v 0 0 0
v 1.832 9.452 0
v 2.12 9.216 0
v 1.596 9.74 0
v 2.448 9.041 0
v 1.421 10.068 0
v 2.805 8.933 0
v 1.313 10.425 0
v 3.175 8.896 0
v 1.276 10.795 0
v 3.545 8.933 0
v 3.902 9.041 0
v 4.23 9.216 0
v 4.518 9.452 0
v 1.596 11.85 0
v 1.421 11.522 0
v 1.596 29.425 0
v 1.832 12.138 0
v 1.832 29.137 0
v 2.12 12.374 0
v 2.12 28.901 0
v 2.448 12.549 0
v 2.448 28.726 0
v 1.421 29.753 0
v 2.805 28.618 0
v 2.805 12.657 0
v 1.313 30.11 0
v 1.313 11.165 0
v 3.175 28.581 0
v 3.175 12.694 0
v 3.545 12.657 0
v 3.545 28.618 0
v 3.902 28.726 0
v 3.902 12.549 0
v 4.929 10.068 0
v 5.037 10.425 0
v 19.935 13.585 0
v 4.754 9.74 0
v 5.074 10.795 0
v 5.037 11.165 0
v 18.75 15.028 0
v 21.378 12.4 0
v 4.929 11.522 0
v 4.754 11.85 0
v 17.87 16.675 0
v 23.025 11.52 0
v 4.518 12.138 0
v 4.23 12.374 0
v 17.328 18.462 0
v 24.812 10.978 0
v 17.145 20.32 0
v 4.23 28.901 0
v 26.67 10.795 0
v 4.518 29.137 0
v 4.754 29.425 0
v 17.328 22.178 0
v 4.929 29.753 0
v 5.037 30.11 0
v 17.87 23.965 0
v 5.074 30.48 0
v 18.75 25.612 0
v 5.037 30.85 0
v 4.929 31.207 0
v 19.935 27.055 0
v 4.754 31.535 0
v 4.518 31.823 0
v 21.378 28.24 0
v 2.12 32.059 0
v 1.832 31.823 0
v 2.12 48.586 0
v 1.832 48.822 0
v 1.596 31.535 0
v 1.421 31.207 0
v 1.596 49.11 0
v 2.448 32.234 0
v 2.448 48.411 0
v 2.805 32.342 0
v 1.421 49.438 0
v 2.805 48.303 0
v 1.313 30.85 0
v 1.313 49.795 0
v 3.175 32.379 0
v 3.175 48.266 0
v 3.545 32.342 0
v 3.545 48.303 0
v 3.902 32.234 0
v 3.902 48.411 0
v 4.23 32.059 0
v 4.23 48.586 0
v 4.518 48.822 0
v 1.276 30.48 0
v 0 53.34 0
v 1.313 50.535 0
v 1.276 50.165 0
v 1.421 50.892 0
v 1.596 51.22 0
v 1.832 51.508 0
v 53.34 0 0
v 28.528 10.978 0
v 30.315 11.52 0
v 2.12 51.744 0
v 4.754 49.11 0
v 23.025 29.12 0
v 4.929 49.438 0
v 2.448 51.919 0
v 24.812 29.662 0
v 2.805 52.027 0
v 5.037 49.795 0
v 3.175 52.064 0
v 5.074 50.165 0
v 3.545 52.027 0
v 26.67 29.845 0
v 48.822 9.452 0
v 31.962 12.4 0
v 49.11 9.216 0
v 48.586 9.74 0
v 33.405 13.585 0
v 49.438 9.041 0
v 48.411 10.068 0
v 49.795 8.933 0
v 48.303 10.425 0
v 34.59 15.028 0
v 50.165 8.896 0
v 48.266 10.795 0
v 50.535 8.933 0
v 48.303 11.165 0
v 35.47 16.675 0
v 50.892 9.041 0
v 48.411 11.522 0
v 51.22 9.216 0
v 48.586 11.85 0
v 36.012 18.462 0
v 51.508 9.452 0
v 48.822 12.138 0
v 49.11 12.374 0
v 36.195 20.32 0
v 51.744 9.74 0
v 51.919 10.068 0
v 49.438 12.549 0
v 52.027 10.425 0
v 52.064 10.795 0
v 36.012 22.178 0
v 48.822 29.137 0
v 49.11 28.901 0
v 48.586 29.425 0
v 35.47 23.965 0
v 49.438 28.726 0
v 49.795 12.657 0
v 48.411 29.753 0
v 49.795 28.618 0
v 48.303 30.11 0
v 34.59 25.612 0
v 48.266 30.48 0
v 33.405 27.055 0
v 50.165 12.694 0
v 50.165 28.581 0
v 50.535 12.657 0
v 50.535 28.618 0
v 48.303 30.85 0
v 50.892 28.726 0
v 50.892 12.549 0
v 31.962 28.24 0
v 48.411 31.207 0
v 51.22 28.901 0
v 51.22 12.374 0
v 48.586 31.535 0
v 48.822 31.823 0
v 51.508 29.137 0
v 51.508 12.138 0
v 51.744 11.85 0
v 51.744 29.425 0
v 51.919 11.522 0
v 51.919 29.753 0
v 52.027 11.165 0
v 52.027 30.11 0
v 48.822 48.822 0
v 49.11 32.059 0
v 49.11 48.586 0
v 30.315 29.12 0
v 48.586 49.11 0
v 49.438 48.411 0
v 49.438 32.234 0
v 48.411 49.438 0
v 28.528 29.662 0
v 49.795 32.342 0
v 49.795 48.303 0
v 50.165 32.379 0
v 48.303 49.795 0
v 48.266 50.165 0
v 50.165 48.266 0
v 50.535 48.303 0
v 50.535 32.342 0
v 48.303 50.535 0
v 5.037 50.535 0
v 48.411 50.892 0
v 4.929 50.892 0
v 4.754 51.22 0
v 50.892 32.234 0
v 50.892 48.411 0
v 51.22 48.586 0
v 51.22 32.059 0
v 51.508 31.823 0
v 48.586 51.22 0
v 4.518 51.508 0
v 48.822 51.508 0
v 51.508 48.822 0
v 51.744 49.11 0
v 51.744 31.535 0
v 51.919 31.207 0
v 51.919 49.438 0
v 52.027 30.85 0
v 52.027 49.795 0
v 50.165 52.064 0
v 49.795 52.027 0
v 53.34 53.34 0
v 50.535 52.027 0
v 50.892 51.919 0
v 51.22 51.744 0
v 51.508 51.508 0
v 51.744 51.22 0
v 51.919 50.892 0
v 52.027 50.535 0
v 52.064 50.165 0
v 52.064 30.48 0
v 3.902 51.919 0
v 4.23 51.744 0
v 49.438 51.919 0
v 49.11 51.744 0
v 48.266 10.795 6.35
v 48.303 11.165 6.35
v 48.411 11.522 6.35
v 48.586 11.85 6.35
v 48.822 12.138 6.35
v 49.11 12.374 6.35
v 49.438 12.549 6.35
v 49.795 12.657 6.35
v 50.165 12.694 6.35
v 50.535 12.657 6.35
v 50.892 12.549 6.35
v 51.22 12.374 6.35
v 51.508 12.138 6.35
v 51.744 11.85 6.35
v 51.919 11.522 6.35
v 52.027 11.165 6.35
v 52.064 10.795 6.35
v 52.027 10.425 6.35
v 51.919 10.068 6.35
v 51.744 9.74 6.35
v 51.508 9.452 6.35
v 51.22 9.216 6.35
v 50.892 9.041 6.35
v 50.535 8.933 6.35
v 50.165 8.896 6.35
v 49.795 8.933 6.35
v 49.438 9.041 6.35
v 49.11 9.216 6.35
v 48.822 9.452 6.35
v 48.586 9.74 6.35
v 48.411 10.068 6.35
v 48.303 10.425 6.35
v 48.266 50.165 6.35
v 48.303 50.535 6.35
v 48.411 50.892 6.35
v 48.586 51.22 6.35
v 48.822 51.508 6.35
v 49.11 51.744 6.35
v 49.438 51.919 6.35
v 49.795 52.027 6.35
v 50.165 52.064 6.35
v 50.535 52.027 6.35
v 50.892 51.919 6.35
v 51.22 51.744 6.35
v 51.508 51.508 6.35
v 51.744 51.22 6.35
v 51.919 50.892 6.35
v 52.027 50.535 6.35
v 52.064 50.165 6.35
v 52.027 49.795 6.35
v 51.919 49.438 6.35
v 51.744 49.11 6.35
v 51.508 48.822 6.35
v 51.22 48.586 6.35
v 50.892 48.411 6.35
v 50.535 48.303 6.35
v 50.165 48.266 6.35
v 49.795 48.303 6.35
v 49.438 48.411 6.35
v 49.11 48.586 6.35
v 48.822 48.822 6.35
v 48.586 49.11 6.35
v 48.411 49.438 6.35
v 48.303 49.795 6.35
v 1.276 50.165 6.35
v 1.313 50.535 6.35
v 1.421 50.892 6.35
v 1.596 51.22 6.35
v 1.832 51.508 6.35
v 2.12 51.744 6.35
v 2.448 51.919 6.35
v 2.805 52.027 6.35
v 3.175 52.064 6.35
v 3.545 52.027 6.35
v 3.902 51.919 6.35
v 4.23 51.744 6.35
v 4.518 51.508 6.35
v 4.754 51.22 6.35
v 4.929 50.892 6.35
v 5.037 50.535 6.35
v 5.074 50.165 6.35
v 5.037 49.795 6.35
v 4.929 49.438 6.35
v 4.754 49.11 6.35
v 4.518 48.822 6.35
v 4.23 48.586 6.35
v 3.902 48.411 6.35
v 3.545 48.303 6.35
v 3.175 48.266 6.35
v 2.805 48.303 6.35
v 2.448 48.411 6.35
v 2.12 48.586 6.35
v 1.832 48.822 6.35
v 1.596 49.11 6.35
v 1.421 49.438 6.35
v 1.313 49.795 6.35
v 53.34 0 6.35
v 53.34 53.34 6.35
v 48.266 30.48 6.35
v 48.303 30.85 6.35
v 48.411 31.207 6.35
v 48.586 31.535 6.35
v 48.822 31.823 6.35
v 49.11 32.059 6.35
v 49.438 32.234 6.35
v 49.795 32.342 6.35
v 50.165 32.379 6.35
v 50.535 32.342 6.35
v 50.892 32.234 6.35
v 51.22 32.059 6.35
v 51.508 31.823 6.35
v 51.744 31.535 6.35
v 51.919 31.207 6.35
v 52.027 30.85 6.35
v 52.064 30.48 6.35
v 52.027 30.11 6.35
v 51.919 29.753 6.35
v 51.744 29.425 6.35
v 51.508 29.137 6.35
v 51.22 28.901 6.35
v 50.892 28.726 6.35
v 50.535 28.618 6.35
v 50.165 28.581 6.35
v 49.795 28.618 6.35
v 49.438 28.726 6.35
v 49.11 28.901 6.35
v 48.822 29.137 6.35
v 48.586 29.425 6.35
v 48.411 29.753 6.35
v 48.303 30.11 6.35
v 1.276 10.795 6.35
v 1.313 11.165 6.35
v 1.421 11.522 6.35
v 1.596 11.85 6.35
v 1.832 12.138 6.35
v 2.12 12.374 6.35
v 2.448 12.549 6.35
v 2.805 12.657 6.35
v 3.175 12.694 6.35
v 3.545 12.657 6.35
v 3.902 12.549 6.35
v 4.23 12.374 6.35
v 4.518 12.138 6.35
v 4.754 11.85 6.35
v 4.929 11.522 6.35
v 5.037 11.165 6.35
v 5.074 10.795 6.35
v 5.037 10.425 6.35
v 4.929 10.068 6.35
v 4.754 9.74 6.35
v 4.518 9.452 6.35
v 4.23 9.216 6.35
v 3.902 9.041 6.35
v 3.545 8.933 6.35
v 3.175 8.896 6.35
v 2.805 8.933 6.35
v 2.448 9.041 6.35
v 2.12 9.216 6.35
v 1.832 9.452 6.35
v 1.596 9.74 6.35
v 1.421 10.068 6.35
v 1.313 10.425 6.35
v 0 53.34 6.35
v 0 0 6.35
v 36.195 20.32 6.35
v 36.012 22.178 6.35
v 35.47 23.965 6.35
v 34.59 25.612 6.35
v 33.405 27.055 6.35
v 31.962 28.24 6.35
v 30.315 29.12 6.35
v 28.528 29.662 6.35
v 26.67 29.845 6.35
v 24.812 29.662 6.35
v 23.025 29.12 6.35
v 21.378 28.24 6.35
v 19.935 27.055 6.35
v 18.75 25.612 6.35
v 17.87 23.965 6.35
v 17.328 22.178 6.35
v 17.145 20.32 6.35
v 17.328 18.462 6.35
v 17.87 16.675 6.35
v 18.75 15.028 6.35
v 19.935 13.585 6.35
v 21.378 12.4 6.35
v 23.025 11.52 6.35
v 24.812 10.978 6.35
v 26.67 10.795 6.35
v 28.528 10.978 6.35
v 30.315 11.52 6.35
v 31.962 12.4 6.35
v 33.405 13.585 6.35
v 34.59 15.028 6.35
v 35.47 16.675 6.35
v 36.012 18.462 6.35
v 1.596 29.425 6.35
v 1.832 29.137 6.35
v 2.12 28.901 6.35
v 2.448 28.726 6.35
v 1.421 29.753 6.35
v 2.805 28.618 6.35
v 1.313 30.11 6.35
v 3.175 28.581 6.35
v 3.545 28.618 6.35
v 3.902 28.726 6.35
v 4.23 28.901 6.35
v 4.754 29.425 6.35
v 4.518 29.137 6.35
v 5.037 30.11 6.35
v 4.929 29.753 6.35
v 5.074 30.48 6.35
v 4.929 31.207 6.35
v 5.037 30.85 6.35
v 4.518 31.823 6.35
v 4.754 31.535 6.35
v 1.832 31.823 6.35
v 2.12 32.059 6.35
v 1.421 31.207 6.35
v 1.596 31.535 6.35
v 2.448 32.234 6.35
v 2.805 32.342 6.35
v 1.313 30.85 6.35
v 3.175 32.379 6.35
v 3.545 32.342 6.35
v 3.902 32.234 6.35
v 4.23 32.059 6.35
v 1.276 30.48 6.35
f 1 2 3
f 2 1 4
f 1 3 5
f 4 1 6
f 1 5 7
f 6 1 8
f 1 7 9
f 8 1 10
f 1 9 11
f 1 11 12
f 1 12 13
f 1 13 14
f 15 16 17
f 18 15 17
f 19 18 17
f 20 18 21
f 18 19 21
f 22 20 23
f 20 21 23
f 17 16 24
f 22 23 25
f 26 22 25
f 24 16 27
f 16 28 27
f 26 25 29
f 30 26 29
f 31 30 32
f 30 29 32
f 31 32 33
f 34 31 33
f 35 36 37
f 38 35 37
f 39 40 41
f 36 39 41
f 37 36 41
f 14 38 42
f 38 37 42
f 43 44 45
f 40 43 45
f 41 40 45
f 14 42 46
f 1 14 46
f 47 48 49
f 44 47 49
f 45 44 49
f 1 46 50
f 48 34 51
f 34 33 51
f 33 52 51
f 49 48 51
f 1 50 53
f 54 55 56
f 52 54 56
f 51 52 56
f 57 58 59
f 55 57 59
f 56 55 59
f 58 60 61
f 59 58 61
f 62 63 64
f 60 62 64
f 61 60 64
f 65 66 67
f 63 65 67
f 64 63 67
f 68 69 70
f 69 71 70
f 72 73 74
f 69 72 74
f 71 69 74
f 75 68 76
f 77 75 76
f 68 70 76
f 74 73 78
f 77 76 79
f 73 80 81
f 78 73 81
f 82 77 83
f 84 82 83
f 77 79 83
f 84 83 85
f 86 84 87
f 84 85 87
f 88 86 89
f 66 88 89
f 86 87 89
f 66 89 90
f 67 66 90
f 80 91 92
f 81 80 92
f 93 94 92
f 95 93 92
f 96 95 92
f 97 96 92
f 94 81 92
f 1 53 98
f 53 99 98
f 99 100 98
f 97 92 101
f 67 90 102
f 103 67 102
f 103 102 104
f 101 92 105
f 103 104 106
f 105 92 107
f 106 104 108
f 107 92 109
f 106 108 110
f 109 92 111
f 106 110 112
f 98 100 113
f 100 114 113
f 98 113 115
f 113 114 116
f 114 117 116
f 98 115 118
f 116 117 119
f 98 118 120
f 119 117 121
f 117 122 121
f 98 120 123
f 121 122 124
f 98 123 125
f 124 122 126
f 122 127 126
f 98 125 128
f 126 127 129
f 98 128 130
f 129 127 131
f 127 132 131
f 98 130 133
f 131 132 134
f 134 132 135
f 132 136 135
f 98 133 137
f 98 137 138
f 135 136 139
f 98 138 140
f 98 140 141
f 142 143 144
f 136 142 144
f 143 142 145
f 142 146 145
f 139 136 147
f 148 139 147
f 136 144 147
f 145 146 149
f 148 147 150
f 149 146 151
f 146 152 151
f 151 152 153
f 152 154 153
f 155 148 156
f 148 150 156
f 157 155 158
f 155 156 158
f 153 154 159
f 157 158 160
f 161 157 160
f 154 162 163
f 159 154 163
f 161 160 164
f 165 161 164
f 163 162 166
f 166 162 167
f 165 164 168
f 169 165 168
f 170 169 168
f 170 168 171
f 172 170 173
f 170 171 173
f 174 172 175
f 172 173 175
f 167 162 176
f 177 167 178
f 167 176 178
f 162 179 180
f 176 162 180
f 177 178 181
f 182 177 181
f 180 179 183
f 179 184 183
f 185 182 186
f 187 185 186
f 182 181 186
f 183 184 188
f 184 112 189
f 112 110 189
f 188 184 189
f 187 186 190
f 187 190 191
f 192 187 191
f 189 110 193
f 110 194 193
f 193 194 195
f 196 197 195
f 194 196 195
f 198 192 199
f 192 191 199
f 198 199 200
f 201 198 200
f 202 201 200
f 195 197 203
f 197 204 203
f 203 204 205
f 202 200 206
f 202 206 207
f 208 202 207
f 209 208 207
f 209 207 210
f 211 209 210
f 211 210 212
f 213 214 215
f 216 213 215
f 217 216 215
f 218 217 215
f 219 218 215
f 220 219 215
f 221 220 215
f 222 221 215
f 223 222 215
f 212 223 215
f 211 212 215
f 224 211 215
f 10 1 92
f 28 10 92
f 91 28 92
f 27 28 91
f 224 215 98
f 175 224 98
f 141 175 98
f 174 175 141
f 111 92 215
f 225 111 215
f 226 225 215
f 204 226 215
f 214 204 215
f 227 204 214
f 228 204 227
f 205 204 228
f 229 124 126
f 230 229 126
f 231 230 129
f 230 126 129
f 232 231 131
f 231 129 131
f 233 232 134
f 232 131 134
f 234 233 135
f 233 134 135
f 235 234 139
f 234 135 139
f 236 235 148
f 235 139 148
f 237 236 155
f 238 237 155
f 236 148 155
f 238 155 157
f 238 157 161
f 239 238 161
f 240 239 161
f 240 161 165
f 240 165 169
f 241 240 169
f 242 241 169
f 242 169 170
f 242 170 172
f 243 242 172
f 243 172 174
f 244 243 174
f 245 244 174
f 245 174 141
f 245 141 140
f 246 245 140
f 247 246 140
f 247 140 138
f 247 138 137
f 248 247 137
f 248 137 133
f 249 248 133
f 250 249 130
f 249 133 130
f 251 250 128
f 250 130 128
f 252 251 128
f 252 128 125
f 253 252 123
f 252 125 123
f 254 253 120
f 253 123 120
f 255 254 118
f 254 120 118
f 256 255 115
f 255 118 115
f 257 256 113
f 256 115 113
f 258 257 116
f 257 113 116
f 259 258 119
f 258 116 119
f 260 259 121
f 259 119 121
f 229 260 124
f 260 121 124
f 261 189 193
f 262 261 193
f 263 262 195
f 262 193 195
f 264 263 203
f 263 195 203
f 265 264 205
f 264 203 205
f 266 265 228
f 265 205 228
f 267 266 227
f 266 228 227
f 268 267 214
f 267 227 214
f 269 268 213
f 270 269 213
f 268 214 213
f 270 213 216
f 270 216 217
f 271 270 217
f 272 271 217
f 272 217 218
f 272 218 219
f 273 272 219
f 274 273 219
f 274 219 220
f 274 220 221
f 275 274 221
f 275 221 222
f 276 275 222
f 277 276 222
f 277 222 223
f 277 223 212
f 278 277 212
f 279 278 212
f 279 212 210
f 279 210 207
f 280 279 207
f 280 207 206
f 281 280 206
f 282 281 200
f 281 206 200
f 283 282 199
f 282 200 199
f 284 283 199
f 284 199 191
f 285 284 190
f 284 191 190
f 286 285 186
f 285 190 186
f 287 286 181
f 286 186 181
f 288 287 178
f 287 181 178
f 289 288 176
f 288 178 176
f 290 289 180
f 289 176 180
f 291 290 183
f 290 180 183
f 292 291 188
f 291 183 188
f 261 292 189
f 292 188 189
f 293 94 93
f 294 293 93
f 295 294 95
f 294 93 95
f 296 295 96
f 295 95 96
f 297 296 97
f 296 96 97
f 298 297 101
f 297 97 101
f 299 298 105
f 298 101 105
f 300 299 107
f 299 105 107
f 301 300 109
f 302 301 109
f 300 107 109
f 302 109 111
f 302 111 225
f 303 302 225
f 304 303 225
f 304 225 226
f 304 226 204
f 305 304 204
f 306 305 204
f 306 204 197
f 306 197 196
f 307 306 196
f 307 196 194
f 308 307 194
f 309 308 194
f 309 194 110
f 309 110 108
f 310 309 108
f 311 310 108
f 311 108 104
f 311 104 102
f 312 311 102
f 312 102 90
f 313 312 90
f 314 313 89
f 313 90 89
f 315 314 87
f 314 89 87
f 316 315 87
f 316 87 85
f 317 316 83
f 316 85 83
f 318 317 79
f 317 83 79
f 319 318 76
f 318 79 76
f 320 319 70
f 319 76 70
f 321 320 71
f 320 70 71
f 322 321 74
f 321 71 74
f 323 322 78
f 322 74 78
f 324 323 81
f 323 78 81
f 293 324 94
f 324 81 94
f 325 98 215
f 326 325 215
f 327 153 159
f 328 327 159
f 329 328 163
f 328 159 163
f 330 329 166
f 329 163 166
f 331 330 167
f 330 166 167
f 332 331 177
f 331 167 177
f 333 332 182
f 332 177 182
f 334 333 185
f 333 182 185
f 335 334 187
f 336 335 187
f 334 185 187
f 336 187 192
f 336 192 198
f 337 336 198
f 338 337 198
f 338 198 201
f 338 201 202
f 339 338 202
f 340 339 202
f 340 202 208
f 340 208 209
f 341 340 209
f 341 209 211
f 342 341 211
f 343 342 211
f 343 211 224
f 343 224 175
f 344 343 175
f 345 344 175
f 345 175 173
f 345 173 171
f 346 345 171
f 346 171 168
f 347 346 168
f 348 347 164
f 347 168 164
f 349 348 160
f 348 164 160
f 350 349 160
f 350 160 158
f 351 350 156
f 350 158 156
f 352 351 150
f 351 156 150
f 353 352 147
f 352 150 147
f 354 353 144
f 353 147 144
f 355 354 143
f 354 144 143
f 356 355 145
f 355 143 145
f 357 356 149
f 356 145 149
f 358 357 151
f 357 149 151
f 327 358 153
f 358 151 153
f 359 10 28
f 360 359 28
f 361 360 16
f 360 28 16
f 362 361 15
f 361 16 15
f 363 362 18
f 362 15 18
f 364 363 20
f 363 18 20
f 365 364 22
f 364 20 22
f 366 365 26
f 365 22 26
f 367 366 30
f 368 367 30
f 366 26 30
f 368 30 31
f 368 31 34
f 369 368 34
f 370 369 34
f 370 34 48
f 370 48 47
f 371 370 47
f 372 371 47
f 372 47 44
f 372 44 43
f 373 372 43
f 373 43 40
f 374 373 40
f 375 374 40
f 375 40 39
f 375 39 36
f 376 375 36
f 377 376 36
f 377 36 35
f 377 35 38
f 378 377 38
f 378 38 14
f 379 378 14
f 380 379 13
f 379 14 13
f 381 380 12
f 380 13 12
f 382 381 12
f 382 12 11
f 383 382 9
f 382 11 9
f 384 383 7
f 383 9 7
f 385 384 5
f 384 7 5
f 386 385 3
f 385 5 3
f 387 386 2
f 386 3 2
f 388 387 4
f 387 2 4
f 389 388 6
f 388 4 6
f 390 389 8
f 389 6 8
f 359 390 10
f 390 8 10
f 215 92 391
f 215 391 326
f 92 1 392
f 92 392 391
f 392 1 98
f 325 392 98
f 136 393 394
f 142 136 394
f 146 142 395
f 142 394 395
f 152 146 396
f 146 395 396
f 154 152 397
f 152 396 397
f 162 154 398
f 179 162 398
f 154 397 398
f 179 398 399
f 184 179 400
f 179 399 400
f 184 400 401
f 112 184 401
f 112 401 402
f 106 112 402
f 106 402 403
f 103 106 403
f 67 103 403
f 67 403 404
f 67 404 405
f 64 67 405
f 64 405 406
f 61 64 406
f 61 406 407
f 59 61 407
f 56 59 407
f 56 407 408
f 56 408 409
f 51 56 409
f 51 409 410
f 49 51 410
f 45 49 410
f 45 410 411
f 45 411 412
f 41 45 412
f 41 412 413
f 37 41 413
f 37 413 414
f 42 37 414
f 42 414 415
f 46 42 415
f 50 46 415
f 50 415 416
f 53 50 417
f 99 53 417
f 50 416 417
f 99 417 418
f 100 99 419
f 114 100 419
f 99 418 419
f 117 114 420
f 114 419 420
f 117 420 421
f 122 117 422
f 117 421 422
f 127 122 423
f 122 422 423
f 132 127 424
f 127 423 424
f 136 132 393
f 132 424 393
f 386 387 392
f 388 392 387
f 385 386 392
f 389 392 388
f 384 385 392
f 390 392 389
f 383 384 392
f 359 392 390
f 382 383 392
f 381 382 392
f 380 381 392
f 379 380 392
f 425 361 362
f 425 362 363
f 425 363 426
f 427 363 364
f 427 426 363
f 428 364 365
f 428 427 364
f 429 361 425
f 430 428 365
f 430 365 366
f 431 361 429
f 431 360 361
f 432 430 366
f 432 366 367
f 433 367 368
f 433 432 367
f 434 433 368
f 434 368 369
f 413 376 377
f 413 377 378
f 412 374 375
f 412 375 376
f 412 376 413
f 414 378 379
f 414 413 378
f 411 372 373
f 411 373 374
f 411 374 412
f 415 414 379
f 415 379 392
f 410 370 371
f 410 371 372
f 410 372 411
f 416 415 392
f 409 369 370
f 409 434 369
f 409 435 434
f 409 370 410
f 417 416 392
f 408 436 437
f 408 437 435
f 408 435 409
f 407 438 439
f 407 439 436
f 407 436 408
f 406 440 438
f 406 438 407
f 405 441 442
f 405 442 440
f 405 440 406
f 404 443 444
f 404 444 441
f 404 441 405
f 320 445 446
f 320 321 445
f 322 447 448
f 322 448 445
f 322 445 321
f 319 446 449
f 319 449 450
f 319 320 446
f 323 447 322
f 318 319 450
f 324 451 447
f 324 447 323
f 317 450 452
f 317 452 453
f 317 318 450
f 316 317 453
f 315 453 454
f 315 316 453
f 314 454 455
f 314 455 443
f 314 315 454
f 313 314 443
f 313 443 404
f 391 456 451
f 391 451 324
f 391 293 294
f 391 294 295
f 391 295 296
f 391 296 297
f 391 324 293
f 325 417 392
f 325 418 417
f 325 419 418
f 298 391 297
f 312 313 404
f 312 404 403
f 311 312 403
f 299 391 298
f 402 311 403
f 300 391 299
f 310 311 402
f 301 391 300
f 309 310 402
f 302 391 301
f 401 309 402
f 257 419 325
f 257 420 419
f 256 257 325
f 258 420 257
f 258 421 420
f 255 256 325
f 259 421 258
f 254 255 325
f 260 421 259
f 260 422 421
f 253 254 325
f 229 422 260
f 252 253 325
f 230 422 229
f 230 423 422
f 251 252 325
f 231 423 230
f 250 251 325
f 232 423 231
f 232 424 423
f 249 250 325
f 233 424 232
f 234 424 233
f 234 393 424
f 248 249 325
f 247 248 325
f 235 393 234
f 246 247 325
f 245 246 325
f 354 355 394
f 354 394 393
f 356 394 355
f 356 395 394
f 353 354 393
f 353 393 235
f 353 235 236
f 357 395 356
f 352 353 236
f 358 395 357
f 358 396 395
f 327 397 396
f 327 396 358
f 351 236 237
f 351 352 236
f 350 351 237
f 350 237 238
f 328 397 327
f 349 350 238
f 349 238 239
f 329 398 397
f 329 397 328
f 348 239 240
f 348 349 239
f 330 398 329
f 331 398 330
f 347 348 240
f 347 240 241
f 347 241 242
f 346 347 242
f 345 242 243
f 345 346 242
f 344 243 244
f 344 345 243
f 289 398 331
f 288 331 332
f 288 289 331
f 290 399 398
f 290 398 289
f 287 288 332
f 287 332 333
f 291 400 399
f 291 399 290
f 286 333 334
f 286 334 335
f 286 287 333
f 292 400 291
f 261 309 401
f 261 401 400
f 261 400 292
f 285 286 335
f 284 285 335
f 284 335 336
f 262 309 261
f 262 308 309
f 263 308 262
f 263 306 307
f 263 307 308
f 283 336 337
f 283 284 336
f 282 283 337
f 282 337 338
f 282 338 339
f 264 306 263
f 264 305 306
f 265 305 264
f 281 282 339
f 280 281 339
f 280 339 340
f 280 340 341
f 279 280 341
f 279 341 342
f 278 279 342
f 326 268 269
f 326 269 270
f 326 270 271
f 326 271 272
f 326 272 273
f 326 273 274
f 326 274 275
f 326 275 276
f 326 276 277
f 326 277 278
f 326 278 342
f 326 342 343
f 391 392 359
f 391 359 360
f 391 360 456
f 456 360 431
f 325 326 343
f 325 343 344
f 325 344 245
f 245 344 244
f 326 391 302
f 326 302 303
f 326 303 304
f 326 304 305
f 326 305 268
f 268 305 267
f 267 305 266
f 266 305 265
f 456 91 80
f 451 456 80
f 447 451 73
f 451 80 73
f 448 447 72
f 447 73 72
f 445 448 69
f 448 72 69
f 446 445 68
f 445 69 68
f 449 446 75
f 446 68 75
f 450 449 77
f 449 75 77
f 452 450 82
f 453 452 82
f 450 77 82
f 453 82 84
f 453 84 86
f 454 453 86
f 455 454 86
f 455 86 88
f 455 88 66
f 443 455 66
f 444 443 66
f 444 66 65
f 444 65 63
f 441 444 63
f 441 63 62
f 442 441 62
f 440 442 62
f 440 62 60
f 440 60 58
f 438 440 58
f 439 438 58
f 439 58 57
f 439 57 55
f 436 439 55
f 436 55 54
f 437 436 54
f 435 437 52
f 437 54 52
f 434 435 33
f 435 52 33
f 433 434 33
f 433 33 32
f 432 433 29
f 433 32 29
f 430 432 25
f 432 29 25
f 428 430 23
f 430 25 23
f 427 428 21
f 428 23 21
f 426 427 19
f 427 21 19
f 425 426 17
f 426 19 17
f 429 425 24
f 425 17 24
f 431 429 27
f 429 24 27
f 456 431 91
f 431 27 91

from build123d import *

# Parameters (mm, degrees)
SKETCH1_W                 = 53.34
SKETCH1_H                 = 53.34
BOSS_EXTRUDE1_DEPTH       = 6.35
SKETCH2_R                 = 9.525
CUT_EXTRUDE1_DEPTH        = 1
CUT_EXTRUDE1_DEPTH_BACK   = 7.35
F_6_CLEARANCE_HOLE1_D     = 3.7973
F_6_CLEARANCE_HOLE1_DEPTH = 6.35


with BuildPart() as part:
    # Sketch1 → Boss-Extrude1 (new body)
    with BuildSketch(Plane.XY):
        with Locations((26.67, 26.67)):
            Rectangle(SKETCH1_W, SKETCH1_H)
    extrude(amount=BOSS_EXTRUDE1_DEPTH)

    # Sketch2 → Cut-Extrude1 (cut, two sides)
    with BuildSketch(Plane.XY.offset(6.35)) as cut_extrude1_sk:
        with Locations((26.67, 20.32)):
            Circle(SKETCH2_R)
    extrude(amount=CUT_EXTRUDE1_DEPTH, mode=Mode.SUBTRACT)
    extrude(cut_extrude1_sk.sketch, amount=-CUT_EXTRUDE1_DEPTH_BACK, mode=Mode.SUBTRACT)

    # #6 Clearance Hole1
    with Locations(Plane.XY.offset(6.35)):
        with Locations((3.175, 50.165), (50.165, 50.165), (50.165, 10.795), (3.175, 10.795), (3.175, 30.48), (50.165, 30.48)):
            Hole(F_6_CLEARANCE_HOLE1_D / 2, depth=F_6_CLEARANCE_HOLE1_DEPTH)


solid = part.part
